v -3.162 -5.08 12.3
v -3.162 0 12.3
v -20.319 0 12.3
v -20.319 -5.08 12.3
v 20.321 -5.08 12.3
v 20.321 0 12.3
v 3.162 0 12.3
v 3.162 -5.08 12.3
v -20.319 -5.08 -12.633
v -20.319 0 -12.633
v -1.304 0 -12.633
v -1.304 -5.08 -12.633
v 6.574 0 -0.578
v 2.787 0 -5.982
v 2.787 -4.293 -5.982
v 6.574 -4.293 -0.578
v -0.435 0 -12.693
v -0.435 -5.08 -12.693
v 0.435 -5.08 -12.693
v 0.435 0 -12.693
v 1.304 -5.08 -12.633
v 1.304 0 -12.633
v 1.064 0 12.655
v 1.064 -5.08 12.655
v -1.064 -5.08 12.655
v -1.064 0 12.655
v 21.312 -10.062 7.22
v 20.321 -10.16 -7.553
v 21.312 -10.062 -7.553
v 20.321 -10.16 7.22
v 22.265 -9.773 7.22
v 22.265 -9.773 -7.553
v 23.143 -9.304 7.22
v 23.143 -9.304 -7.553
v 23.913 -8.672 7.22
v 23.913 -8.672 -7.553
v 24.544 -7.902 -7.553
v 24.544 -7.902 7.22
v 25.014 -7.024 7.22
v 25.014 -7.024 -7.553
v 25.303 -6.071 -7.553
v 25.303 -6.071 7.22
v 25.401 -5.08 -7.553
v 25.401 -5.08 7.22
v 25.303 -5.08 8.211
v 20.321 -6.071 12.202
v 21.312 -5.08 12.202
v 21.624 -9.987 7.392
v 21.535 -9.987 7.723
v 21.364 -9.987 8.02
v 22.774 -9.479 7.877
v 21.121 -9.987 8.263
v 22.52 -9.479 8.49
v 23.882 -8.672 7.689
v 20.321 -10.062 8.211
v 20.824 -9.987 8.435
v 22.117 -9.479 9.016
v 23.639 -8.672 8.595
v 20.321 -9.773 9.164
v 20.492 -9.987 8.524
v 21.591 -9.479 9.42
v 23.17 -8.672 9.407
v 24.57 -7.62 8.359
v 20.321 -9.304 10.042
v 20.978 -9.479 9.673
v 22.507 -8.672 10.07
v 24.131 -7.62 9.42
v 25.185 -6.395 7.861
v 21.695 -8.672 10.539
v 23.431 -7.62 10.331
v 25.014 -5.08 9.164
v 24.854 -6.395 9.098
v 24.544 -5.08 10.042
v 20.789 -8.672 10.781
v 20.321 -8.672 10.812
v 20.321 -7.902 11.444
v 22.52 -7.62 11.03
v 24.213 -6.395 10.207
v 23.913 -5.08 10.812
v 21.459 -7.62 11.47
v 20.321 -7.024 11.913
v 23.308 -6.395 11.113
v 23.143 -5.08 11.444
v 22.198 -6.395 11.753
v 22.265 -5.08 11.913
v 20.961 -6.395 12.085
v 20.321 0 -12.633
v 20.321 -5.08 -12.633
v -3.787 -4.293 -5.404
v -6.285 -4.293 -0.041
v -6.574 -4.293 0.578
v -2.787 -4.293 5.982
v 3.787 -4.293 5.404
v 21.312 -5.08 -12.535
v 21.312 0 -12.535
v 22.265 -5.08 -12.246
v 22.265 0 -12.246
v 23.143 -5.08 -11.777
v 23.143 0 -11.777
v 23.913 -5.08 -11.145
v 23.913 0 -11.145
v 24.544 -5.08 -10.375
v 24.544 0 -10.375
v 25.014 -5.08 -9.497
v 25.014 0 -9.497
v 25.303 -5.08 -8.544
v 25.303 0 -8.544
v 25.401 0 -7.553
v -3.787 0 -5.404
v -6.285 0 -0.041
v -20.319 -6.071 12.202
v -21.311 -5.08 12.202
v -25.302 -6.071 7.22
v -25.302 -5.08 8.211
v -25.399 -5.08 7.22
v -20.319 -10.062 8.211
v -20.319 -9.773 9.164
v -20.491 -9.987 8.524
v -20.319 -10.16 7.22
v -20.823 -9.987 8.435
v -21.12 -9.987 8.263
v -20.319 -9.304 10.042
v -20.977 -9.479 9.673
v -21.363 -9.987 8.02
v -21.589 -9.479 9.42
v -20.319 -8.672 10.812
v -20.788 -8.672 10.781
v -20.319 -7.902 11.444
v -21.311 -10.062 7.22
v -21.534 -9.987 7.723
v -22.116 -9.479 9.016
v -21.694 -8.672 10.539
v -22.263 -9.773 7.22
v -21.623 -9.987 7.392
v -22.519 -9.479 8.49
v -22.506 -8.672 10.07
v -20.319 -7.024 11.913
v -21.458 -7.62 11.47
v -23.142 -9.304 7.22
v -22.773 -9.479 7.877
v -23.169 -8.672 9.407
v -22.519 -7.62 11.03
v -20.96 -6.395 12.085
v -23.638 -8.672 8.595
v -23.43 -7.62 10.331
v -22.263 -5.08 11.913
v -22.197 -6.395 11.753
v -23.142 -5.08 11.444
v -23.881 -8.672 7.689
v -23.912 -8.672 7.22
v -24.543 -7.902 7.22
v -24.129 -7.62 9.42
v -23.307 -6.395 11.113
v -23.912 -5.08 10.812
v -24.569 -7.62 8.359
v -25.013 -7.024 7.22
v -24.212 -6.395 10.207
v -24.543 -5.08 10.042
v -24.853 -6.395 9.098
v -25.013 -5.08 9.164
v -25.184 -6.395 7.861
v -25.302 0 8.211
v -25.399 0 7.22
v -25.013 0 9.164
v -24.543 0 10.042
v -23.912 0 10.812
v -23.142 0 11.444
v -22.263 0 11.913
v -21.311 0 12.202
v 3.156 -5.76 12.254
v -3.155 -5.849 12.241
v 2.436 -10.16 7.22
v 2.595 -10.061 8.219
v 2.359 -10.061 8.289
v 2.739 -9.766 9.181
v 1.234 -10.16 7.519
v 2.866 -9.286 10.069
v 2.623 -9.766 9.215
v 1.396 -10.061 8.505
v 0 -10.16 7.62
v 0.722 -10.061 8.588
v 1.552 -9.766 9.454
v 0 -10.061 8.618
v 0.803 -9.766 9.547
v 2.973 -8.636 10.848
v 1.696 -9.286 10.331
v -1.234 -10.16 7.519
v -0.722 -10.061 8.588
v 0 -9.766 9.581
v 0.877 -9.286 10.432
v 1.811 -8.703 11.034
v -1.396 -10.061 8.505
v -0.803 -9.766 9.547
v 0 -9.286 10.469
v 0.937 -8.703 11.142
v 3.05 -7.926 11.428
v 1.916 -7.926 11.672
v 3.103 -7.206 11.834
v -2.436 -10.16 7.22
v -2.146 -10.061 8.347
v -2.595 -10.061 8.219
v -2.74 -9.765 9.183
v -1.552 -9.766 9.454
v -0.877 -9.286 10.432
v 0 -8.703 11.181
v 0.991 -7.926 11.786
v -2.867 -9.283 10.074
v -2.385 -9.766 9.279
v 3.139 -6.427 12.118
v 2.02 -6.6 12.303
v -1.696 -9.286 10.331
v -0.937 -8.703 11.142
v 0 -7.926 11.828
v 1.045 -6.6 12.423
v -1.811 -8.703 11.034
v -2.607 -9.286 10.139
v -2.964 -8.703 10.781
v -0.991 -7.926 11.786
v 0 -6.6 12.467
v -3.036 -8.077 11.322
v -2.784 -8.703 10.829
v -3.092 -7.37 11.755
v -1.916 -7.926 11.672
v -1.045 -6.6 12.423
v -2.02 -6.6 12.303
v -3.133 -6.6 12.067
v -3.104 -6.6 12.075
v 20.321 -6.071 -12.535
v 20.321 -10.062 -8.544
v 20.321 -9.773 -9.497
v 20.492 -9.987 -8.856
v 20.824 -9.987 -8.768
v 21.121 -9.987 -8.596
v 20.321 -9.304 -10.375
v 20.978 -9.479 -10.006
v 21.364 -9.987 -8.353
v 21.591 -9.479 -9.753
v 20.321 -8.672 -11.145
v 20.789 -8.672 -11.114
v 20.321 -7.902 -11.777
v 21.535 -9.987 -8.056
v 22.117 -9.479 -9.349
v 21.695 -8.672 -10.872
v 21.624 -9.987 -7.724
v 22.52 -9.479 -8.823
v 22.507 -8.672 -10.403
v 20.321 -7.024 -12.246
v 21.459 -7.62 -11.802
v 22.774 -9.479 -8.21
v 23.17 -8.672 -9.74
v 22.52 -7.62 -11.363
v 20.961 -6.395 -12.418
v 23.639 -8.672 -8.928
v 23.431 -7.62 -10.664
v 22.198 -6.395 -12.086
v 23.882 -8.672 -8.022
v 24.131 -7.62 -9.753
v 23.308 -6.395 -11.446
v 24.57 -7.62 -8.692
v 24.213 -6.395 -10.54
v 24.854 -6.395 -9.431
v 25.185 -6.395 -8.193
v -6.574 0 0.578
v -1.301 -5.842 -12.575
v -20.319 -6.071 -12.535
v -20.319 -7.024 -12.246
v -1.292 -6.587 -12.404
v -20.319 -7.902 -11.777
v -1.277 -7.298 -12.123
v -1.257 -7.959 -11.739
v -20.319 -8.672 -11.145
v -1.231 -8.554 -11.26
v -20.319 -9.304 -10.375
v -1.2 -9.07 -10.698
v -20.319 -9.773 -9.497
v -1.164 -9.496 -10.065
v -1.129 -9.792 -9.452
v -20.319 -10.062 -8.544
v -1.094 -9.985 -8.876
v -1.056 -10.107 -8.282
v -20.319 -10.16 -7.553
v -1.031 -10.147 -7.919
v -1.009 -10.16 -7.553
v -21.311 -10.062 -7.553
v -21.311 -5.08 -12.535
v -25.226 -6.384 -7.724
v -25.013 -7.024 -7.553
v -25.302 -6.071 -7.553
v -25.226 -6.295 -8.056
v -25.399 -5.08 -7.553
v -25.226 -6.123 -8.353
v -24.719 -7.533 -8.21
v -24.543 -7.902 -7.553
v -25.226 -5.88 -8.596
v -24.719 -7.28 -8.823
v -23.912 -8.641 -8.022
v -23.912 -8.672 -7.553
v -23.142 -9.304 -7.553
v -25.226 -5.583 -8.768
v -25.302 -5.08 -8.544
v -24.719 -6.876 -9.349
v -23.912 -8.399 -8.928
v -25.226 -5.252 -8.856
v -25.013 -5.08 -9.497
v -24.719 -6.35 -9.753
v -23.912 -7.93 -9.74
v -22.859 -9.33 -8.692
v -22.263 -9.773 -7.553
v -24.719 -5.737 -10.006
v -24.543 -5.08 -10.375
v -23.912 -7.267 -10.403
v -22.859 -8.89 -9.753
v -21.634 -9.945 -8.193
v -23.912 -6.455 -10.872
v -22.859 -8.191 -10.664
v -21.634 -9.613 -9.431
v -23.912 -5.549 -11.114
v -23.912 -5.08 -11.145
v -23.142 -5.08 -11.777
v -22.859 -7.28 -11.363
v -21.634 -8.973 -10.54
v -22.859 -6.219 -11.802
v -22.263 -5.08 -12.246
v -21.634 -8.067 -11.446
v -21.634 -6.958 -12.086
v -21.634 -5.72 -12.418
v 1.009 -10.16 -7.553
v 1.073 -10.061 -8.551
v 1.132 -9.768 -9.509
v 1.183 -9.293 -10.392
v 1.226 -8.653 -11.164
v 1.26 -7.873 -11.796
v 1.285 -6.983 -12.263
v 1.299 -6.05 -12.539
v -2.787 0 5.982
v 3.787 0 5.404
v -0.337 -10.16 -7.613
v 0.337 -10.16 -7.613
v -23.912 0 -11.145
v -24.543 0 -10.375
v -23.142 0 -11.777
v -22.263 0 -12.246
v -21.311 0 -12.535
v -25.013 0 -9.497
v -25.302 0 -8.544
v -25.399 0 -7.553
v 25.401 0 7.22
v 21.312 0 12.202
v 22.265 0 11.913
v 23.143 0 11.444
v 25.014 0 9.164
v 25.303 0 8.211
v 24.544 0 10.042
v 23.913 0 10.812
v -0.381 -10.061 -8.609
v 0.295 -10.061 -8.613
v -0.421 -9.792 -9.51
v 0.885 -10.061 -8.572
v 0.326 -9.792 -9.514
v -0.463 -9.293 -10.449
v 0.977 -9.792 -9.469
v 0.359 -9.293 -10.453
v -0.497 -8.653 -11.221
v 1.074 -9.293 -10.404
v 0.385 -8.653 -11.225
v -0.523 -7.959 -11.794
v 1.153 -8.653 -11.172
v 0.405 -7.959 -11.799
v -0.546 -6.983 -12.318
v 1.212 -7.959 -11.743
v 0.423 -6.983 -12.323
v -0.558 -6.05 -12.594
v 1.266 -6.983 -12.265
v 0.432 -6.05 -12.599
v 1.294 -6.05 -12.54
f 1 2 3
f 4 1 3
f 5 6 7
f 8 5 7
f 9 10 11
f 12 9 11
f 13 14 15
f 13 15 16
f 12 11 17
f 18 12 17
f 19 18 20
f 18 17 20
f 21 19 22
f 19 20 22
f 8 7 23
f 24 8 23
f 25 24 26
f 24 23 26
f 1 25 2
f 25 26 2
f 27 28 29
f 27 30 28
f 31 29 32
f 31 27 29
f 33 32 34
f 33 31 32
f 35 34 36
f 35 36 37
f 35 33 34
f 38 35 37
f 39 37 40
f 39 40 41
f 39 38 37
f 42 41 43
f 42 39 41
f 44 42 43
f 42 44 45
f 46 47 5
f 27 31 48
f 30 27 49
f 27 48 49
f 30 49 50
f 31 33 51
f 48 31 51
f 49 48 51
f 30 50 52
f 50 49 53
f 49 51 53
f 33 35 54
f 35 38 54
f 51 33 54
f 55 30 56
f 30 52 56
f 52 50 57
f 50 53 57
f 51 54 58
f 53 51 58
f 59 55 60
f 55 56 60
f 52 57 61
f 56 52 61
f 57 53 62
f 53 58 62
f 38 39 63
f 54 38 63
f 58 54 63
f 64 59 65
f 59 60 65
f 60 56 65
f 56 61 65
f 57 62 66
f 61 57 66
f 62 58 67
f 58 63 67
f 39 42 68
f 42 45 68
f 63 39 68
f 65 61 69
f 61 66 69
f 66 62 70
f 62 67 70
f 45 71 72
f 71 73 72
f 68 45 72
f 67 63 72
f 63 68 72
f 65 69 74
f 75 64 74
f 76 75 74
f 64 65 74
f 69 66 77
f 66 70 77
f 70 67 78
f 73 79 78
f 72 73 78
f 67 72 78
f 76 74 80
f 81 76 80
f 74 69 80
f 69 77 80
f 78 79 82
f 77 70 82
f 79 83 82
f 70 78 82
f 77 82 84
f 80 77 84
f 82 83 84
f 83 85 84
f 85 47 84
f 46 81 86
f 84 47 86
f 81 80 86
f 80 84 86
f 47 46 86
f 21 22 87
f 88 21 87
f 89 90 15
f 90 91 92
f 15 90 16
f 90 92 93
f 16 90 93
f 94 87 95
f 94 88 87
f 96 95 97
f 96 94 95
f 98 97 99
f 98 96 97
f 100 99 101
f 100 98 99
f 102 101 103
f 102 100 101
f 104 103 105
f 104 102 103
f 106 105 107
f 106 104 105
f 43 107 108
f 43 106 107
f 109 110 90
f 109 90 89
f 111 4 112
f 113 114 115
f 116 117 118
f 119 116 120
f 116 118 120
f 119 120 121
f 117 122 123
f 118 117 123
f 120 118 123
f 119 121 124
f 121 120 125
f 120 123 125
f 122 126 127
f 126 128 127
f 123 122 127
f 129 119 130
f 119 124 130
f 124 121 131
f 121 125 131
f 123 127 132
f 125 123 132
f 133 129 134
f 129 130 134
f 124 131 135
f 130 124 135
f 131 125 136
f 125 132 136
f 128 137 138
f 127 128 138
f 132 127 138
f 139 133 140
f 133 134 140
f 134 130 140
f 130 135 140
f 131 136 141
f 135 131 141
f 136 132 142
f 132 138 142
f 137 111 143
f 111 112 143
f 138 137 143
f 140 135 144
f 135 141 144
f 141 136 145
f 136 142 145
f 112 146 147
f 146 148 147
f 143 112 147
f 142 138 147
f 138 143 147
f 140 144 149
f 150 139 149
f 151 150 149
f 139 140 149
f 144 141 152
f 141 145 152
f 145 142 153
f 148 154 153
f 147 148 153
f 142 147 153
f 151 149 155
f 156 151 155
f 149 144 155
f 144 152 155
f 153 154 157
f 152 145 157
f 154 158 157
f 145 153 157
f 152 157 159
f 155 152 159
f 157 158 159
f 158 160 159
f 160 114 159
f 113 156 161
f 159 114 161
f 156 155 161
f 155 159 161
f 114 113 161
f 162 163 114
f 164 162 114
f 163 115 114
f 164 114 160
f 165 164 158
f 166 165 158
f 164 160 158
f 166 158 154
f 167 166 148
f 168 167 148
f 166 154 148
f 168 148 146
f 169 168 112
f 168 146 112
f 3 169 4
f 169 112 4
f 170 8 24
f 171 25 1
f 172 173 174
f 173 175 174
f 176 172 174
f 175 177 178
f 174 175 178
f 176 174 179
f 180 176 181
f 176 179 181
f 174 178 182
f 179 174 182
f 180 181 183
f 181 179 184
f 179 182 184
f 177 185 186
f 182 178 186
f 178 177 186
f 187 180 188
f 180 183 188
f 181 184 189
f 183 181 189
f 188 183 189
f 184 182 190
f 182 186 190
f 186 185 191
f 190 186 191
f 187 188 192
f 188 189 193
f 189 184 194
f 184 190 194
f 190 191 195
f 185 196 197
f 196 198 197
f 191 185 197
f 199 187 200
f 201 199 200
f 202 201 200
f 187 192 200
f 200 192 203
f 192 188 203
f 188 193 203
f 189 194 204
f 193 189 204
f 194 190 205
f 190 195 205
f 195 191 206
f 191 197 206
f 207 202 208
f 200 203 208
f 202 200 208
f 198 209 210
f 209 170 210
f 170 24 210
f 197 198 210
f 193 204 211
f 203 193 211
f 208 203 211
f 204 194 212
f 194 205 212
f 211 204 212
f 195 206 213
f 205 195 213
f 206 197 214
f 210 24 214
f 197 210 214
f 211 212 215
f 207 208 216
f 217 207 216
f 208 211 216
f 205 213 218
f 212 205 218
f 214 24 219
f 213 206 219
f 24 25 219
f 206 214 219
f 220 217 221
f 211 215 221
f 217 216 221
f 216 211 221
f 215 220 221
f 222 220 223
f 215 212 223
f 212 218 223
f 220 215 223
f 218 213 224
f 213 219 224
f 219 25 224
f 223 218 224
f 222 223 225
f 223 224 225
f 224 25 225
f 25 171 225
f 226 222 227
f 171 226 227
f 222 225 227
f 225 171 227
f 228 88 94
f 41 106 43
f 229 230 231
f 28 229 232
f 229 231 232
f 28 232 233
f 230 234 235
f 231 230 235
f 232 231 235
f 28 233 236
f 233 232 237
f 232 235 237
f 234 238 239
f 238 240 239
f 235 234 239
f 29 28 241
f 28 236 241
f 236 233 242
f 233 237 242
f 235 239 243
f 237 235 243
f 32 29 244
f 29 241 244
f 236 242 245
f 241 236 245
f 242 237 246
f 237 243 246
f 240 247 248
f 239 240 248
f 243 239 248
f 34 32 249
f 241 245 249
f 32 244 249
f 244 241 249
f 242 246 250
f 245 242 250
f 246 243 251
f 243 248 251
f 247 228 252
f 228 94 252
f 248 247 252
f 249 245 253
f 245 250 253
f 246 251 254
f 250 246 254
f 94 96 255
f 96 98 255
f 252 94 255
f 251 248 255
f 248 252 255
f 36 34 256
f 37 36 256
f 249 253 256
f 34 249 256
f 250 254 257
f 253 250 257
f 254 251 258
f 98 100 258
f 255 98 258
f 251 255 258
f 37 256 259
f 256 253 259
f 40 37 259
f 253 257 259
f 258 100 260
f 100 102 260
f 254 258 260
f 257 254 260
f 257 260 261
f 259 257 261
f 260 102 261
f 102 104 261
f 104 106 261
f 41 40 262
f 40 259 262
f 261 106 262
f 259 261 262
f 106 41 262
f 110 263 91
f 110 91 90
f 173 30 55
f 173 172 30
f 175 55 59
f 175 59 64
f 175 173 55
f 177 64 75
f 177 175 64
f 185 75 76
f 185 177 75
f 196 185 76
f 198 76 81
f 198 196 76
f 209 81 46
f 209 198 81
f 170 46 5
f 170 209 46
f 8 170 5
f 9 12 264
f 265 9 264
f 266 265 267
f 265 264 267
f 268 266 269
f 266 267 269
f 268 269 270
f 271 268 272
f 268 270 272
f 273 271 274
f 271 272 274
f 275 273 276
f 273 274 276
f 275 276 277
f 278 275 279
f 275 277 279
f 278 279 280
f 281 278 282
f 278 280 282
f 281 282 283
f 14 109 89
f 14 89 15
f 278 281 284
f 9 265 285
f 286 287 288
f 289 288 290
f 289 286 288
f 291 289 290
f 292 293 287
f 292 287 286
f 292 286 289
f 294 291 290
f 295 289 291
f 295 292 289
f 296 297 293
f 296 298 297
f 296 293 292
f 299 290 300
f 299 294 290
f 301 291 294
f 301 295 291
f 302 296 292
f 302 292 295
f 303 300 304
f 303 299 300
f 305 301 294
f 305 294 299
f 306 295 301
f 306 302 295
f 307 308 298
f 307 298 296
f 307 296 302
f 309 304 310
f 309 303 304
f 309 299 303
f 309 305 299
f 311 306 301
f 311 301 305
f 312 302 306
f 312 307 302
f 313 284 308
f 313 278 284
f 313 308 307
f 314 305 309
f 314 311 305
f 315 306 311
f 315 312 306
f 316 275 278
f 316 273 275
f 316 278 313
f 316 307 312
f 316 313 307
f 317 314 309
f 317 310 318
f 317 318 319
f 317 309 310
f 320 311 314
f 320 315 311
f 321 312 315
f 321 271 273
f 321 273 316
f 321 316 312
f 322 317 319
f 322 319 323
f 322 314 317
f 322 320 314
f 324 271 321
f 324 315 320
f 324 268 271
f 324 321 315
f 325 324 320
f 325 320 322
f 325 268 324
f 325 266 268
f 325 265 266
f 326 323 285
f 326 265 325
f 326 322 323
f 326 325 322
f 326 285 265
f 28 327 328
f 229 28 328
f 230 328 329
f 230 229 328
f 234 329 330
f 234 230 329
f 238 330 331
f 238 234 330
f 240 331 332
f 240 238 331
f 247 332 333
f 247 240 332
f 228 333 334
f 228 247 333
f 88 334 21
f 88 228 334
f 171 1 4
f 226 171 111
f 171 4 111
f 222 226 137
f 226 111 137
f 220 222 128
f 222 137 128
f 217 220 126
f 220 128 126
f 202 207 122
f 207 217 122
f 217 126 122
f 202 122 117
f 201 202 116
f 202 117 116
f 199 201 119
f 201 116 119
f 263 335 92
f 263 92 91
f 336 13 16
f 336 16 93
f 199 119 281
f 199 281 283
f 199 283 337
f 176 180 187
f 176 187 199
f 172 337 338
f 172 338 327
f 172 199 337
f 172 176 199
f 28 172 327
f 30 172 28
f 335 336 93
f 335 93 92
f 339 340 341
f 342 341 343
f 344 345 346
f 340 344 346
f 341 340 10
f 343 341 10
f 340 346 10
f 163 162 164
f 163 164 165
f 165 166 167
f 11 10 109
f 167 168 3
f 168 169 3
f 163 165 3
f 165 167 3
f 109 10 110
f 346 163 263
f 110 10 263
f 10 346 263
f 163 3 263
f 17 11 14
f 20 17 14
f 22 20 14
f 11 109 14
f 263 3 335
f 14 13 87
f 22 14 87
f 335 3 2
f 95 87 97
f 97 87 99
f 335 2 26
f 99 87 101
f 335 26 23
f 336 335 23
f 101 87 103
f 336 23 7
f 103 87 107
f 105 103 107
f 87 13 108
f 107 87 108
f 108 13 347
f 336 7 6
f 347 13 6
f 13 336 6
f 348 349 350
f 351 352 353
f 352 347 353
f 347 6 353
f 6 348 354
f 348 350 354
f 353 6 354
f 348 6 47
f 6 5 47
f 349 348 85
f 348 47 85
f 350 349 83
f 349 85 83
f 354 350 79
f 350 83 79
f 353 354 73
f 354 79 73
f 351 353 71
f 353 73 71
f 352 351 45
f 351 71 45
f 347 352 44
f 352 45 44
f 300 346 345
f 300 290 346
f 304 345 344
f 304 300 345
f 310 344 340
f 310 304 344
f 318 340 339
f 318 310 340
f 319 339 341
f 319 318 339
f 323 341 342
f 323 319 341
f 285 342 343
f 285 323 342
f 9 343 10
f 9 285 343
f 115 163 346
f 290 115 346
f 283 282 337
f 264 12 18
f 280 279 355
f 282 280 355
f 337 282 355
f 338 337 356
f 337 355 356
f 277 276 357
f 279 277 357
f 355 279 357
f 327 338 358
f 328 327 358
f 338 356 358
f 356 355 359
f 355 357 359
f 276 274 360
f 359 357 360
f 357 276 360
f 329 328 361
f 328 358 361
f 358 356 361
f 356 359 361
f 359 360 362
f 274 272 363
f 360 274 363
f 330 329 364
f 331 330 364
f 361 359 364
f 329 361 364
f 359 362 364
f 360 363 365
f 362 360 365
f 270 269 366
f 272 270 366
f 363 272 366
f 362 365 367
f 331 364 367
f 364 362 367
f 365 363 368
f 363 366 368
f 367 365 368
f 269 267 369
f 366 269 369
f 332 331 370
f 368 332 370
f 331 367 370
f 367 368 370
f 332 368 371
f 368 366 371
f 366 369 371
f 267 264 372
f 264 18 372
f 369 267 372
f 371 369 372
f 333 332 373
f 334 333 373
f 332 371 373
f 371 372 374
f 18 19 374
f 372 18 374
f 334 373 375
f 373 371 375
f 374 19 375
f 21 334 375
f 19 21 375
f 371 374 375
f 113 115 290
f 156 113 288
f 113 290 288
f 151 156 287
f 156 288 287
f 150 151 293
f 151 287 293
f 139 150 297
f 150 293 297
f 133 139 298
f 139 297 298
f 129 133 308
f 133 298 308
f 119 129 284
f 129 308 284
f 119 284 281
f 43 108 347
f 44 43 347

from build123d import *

# Parameters (mm, degrees)
F1_DEPTH = 10.16
F2_DEPTH = 4.2926
F3_R     = 5.08


with BuildPart() as f1:
    # F0 (on Front) → F1 (new body)
    with BuildSketch(Plane.XZ):
        with BuildLine():
            ThreePointArc((-1.3040083906, -12.6328762409), (-9.4021103543, -8.5375828479), (-12.6997273966, -0.0832108883))
            Line((-12.6997273966, -0.0832108883), (-25.3994547932, -0.1664217767))
            Line((-25.3994547932, -0.1664217767), (-25.3994547932, -12.6328762409))
            Line((-25.3994547932, -12.6328762409), (-1.3040083906, -12.6328762409))
        make_face()
        with BuildLine():
            Line((-25.3994547932, -0.1664217767), (-12.6997273966, -0.0832108883))
            ThreePointArc((-12.6997273966, -0.0832108883), (-10.061608872, 7.7494533295), (-3.162150516, 12.3000326875))
            Line((-3.162150516, 12.3000326875), (-25.3994547932, 12.3000326875))
            Line((-25.3994547932, 12.3000326875), (-25.3994547932, -0.1664217767))
        make_face()
        with BuildLine():
            Line((25.4005452068, 12.3000326875), (3.162150516, 12.3000326875))
            ThreePointArc((3.162150516, 12.3000326875), (10.0361673848, 7.7823739452), (12.7, 0))
            ThreePointArc((12.7, 0), (9.4300293361, -8.5067353738), (1.3040083906, -12.6328762409))
            Line((1.3040083906, -12.6328762409), (25.4005452068, -12.6328762409))
            Line((25.4005452068, -12.6328762409), (25.4005452068, 12.3000326875))
        make_face()
        with BuildLine():
            ThreePointArc((-3.162150516, 12.3000326875), (-10.061608872, 7.7494533295), (-12.6997273966, -0.0832108883))
            ThreePointArc((-12.6997273966, -0.0832108883), (-9.4021103543, -8.5375828479), (-1.3040083906, -12.6328762409))
            Line((-1.3040083906, -12.6328762409), (1.3040083906, -12.6328762409))
            ThreePointArc((1.3040083906, -12.6328762409), (9.4300293361, -8.5067353738), (12.7, 0))
            ThreePointArc((12.7, 0), (10.0361673848, 7.7823739452), (3.162150516, 12.3000326875))
            Line((3.162150516, 12.3000326875), (-3.162150516, 12.3000326875))
        make_face()
        Polygon((-2.7865785047, 5.9819127574), (3.7871991587, 5.4042041534), (6.5737776635, -0.5777086039), (2.7865785047, -5.9819127574), (-3.7871991587, -5.4042041534), (-6.2854766309, -0.0411835686), (-6.5737776635, 0.5777086039), align=None, mode=Mode.SUBTRACT)
        Polygon((6.5737776635, -0.5777086039), (3.7871991587, 5.4042041534), (-2.7865785047, 5.9819127574), (-6.5737776635, 0.5777086039), (-6.2854766309, -0.0411835686), (-3.7871991587, -5.4042041534), (2.7865785047, -5.9819127574), align=None)
        with BuildLine():
            Line((1.3040083906, -12.6328762409), (-1.3040083906, -12.6328762409))
            ThreePointArc((-1.3040083906, -12.6328762409), (0, -12.7), (1.3040083906, -12.6328762409))
        make_face()
        with BuildLine():
            ThreePointArc((3.162150516, 12.3000326875), (0, 12.7), (-3.162150516, 12.3000326875))
            Line((-3.162150516, 12.3000326875), (3.162150516, 12.3000326875))
        make_face()
    extrude(amount=F1_DEPTH)

    # F0 (on Front) → F2 (cut)
    with BuildSketch(Plane.XZ):
        Polygon((6.5737776635, -0.5777086039), (3.7871991587, 5.4042041534), (-2.7865785047, 5.9819127574), (-6.5737776635, 0.5777086039), (-6.2854766309, -0.0411835686), (-3.7871991587, -5.4042041534), (2.7865785047, -5.9819127574), align=None)
    extrude(amount=F2_DEPTH, mode=Mode.SUBTRACT)

    # F3
    f3_edges = [f1.edges().sort_by_distance(p)[0] for p in [
        (-25.399455, -5.08, 12.300033),
        (25.400545, -5.08, 12.300033),
        (25.400545, -5.08, -12.632876),
        (13.352277, -10.16, -12.632876),
        (-13.351732, -10.16, -12.632876),
        (0, -10.16, -12.7),
        (25.400545, -10.16, -0.166422),
        (14.281348, -10.16, 12.300033),
        (0, -10.16, 12.7),
        (-14.280803, -10.16, 12.300033),
        (-25.399455, -10.16, -0.166422),
        (-25.399455, -5.08, -12.632876),
    ]]
    fillet(f3_edges, radius=F3_R)


solid = f1.part
